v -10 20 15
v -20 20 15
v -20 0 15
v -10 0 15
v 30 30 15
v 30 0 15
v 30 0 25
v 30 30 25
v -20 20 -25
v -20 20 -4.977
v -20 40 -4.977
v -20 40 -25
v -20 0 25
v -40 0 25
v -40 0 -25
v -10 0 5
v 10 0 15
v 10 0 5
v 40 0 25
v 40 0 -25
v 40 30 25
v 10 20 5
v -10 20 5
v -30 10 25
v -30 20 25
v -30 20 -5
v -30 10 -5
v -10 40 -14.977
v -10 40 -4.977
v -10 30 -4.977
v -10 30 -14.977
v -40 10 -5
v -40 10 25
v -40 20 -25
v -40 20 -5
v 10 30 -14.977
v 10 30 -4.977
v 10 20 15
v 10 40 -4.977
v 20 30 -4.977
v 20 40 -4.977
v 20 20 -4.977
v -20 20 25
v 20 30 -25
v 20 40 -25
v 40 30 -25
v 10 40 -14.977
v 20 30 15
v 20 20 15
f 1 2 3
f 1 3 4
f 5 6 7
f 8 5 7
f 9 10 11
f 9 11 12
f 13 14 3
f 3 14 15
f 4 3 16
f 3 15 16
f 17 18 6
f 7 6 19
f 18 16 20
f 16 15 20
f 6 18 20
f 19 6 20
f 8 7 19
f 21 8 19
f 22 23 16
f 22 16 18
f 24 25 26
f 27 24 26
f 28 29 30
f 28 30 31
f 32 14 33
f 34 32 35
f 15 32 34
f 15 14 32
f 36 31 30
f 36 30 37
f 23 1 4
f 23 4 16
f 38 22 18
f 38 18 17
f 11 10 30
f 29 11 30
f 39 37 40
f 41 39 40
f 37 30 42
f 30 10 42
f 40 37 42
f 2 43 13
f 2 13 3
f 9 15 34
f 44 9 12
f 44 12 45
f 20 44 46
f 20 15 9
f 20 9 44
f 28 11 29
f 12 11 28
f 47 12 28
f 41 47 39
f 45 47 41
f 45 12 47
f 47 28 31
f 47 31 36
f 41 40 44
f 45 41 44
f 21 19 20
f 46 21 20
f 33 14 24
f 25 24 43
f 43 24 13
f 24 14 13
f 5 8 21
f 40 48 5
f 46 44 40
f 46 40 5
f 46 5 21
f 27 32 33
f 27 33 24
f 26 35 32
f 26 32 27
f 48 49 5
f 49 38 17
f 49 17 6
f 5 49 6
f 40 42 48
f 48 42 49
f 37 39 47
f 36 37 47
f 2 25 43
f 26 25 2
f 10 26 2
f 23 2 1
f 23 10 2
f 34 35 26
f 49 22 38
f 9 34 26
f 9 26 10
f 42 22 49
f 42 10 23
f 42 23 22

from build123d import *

# Parameters (mm, degrees)
SKETCH1_W           = 80
SKETCH1_H           = 50
BOSS_EXTRUDE1_DEPTH = 20
CUT_EXTRUDE1_DEPTH  = 20
SKETCH3_W           = 10
SKETCH3_H           = 30
CUT_EXTRUDE2_DEPTH  = 10
BOSS_EXTRUDE2_DEPTH = 10
SKETCH6_W           = 40
SKETCH6_H           = 20.022717562
BOSS_EXTRUDE3_DEPTH = 20
SKETCH7_W           = 20
SKETCH7_H           = 10
CUT_EXTRUDE3_DEPTH  = 10


with BuildPart() as part:
    # Sketch1 → Boss-Extrude1 (new body)
    with BuildSketch(Plane(origin=(0, 0, 0), x_dir=(1, 0, 0), z_dir=(0, 1, 0))):
        Rectangle(SKETCH1_W, SKETCH1_H)
    extrude(amount=BOSS_EXTRUDE1_DEPTH)

    # Sketch2 → Cut-Extrude1 (cut)
    with BuildSketch(Plane(origin=(0, 20, 0), x_dir=(1, 0, 0), z_dir=(0, 1, 0))):
        Polygon((-20, -25), (-20, -15), (-10, -15), (-10, -5), (10, -5), (10, -15), (30, -15), (30, -25), align=None)
    extrude(amount=-CUT_EXTRUDE1_DEPTH, mode=Mode.SUBTRACT)

    # Sketch3 → Cut-Extrude2 (cut)
    with BuildSketch(Plane(origin=(0, 20, 0), x_dir=(1, 0, 0), z_dir=(0, 1, 0))):
        with Locations((-35, -10)):
            Rectangle(SKETCH3_W, SKETCH3_H)
    extrude(amount=-CUT_EXTRUDE2_DEPTH, mode=Mode.SUBTRACT)

    # Sketch4 → Boss-Extrude2 (add)
    with BuildSketch(Plane(origin=(0, 20, 0), x_dir=(1, 0, 0), z_dir=(0, 1, 0))):
        Polygon((40, -25), (40, 25), (20, 25), (20, -15), (30, -15), (30, -25), align=None)
    extrude(amount=BOSS_EXTRUDE2_DEPTH)

    # Sketch6 → Boss-Extrude3 (add)
    with BuildSketch(Plane(origin=(0, 20, 0), x_dir=(1, 0, 0), z_dir=(0, 1, 0))):
        with Locations((0, 14.988641219)):
            Rectangle(SKETCH6_W, SKETCH6_H)
    extrude(amount=BOSS_EXTRUDE3_DEPTH)

    # Sketch7 → Cut-Extrude3 (cut)
    with BuildSketch(Plane(origin=(0, 40, 0), x_dir=(1, 0, 0), z_dir=(0, 1, 0))):
        with Locations((0, 9.977282438)):
            Rectangle(SKETCH7_W, SKETCH7_H)
    extrude(amount=-CUT_EXTRUDE3_DEPTH, mode=Mode.SUBTRACT)


solid = part.part
